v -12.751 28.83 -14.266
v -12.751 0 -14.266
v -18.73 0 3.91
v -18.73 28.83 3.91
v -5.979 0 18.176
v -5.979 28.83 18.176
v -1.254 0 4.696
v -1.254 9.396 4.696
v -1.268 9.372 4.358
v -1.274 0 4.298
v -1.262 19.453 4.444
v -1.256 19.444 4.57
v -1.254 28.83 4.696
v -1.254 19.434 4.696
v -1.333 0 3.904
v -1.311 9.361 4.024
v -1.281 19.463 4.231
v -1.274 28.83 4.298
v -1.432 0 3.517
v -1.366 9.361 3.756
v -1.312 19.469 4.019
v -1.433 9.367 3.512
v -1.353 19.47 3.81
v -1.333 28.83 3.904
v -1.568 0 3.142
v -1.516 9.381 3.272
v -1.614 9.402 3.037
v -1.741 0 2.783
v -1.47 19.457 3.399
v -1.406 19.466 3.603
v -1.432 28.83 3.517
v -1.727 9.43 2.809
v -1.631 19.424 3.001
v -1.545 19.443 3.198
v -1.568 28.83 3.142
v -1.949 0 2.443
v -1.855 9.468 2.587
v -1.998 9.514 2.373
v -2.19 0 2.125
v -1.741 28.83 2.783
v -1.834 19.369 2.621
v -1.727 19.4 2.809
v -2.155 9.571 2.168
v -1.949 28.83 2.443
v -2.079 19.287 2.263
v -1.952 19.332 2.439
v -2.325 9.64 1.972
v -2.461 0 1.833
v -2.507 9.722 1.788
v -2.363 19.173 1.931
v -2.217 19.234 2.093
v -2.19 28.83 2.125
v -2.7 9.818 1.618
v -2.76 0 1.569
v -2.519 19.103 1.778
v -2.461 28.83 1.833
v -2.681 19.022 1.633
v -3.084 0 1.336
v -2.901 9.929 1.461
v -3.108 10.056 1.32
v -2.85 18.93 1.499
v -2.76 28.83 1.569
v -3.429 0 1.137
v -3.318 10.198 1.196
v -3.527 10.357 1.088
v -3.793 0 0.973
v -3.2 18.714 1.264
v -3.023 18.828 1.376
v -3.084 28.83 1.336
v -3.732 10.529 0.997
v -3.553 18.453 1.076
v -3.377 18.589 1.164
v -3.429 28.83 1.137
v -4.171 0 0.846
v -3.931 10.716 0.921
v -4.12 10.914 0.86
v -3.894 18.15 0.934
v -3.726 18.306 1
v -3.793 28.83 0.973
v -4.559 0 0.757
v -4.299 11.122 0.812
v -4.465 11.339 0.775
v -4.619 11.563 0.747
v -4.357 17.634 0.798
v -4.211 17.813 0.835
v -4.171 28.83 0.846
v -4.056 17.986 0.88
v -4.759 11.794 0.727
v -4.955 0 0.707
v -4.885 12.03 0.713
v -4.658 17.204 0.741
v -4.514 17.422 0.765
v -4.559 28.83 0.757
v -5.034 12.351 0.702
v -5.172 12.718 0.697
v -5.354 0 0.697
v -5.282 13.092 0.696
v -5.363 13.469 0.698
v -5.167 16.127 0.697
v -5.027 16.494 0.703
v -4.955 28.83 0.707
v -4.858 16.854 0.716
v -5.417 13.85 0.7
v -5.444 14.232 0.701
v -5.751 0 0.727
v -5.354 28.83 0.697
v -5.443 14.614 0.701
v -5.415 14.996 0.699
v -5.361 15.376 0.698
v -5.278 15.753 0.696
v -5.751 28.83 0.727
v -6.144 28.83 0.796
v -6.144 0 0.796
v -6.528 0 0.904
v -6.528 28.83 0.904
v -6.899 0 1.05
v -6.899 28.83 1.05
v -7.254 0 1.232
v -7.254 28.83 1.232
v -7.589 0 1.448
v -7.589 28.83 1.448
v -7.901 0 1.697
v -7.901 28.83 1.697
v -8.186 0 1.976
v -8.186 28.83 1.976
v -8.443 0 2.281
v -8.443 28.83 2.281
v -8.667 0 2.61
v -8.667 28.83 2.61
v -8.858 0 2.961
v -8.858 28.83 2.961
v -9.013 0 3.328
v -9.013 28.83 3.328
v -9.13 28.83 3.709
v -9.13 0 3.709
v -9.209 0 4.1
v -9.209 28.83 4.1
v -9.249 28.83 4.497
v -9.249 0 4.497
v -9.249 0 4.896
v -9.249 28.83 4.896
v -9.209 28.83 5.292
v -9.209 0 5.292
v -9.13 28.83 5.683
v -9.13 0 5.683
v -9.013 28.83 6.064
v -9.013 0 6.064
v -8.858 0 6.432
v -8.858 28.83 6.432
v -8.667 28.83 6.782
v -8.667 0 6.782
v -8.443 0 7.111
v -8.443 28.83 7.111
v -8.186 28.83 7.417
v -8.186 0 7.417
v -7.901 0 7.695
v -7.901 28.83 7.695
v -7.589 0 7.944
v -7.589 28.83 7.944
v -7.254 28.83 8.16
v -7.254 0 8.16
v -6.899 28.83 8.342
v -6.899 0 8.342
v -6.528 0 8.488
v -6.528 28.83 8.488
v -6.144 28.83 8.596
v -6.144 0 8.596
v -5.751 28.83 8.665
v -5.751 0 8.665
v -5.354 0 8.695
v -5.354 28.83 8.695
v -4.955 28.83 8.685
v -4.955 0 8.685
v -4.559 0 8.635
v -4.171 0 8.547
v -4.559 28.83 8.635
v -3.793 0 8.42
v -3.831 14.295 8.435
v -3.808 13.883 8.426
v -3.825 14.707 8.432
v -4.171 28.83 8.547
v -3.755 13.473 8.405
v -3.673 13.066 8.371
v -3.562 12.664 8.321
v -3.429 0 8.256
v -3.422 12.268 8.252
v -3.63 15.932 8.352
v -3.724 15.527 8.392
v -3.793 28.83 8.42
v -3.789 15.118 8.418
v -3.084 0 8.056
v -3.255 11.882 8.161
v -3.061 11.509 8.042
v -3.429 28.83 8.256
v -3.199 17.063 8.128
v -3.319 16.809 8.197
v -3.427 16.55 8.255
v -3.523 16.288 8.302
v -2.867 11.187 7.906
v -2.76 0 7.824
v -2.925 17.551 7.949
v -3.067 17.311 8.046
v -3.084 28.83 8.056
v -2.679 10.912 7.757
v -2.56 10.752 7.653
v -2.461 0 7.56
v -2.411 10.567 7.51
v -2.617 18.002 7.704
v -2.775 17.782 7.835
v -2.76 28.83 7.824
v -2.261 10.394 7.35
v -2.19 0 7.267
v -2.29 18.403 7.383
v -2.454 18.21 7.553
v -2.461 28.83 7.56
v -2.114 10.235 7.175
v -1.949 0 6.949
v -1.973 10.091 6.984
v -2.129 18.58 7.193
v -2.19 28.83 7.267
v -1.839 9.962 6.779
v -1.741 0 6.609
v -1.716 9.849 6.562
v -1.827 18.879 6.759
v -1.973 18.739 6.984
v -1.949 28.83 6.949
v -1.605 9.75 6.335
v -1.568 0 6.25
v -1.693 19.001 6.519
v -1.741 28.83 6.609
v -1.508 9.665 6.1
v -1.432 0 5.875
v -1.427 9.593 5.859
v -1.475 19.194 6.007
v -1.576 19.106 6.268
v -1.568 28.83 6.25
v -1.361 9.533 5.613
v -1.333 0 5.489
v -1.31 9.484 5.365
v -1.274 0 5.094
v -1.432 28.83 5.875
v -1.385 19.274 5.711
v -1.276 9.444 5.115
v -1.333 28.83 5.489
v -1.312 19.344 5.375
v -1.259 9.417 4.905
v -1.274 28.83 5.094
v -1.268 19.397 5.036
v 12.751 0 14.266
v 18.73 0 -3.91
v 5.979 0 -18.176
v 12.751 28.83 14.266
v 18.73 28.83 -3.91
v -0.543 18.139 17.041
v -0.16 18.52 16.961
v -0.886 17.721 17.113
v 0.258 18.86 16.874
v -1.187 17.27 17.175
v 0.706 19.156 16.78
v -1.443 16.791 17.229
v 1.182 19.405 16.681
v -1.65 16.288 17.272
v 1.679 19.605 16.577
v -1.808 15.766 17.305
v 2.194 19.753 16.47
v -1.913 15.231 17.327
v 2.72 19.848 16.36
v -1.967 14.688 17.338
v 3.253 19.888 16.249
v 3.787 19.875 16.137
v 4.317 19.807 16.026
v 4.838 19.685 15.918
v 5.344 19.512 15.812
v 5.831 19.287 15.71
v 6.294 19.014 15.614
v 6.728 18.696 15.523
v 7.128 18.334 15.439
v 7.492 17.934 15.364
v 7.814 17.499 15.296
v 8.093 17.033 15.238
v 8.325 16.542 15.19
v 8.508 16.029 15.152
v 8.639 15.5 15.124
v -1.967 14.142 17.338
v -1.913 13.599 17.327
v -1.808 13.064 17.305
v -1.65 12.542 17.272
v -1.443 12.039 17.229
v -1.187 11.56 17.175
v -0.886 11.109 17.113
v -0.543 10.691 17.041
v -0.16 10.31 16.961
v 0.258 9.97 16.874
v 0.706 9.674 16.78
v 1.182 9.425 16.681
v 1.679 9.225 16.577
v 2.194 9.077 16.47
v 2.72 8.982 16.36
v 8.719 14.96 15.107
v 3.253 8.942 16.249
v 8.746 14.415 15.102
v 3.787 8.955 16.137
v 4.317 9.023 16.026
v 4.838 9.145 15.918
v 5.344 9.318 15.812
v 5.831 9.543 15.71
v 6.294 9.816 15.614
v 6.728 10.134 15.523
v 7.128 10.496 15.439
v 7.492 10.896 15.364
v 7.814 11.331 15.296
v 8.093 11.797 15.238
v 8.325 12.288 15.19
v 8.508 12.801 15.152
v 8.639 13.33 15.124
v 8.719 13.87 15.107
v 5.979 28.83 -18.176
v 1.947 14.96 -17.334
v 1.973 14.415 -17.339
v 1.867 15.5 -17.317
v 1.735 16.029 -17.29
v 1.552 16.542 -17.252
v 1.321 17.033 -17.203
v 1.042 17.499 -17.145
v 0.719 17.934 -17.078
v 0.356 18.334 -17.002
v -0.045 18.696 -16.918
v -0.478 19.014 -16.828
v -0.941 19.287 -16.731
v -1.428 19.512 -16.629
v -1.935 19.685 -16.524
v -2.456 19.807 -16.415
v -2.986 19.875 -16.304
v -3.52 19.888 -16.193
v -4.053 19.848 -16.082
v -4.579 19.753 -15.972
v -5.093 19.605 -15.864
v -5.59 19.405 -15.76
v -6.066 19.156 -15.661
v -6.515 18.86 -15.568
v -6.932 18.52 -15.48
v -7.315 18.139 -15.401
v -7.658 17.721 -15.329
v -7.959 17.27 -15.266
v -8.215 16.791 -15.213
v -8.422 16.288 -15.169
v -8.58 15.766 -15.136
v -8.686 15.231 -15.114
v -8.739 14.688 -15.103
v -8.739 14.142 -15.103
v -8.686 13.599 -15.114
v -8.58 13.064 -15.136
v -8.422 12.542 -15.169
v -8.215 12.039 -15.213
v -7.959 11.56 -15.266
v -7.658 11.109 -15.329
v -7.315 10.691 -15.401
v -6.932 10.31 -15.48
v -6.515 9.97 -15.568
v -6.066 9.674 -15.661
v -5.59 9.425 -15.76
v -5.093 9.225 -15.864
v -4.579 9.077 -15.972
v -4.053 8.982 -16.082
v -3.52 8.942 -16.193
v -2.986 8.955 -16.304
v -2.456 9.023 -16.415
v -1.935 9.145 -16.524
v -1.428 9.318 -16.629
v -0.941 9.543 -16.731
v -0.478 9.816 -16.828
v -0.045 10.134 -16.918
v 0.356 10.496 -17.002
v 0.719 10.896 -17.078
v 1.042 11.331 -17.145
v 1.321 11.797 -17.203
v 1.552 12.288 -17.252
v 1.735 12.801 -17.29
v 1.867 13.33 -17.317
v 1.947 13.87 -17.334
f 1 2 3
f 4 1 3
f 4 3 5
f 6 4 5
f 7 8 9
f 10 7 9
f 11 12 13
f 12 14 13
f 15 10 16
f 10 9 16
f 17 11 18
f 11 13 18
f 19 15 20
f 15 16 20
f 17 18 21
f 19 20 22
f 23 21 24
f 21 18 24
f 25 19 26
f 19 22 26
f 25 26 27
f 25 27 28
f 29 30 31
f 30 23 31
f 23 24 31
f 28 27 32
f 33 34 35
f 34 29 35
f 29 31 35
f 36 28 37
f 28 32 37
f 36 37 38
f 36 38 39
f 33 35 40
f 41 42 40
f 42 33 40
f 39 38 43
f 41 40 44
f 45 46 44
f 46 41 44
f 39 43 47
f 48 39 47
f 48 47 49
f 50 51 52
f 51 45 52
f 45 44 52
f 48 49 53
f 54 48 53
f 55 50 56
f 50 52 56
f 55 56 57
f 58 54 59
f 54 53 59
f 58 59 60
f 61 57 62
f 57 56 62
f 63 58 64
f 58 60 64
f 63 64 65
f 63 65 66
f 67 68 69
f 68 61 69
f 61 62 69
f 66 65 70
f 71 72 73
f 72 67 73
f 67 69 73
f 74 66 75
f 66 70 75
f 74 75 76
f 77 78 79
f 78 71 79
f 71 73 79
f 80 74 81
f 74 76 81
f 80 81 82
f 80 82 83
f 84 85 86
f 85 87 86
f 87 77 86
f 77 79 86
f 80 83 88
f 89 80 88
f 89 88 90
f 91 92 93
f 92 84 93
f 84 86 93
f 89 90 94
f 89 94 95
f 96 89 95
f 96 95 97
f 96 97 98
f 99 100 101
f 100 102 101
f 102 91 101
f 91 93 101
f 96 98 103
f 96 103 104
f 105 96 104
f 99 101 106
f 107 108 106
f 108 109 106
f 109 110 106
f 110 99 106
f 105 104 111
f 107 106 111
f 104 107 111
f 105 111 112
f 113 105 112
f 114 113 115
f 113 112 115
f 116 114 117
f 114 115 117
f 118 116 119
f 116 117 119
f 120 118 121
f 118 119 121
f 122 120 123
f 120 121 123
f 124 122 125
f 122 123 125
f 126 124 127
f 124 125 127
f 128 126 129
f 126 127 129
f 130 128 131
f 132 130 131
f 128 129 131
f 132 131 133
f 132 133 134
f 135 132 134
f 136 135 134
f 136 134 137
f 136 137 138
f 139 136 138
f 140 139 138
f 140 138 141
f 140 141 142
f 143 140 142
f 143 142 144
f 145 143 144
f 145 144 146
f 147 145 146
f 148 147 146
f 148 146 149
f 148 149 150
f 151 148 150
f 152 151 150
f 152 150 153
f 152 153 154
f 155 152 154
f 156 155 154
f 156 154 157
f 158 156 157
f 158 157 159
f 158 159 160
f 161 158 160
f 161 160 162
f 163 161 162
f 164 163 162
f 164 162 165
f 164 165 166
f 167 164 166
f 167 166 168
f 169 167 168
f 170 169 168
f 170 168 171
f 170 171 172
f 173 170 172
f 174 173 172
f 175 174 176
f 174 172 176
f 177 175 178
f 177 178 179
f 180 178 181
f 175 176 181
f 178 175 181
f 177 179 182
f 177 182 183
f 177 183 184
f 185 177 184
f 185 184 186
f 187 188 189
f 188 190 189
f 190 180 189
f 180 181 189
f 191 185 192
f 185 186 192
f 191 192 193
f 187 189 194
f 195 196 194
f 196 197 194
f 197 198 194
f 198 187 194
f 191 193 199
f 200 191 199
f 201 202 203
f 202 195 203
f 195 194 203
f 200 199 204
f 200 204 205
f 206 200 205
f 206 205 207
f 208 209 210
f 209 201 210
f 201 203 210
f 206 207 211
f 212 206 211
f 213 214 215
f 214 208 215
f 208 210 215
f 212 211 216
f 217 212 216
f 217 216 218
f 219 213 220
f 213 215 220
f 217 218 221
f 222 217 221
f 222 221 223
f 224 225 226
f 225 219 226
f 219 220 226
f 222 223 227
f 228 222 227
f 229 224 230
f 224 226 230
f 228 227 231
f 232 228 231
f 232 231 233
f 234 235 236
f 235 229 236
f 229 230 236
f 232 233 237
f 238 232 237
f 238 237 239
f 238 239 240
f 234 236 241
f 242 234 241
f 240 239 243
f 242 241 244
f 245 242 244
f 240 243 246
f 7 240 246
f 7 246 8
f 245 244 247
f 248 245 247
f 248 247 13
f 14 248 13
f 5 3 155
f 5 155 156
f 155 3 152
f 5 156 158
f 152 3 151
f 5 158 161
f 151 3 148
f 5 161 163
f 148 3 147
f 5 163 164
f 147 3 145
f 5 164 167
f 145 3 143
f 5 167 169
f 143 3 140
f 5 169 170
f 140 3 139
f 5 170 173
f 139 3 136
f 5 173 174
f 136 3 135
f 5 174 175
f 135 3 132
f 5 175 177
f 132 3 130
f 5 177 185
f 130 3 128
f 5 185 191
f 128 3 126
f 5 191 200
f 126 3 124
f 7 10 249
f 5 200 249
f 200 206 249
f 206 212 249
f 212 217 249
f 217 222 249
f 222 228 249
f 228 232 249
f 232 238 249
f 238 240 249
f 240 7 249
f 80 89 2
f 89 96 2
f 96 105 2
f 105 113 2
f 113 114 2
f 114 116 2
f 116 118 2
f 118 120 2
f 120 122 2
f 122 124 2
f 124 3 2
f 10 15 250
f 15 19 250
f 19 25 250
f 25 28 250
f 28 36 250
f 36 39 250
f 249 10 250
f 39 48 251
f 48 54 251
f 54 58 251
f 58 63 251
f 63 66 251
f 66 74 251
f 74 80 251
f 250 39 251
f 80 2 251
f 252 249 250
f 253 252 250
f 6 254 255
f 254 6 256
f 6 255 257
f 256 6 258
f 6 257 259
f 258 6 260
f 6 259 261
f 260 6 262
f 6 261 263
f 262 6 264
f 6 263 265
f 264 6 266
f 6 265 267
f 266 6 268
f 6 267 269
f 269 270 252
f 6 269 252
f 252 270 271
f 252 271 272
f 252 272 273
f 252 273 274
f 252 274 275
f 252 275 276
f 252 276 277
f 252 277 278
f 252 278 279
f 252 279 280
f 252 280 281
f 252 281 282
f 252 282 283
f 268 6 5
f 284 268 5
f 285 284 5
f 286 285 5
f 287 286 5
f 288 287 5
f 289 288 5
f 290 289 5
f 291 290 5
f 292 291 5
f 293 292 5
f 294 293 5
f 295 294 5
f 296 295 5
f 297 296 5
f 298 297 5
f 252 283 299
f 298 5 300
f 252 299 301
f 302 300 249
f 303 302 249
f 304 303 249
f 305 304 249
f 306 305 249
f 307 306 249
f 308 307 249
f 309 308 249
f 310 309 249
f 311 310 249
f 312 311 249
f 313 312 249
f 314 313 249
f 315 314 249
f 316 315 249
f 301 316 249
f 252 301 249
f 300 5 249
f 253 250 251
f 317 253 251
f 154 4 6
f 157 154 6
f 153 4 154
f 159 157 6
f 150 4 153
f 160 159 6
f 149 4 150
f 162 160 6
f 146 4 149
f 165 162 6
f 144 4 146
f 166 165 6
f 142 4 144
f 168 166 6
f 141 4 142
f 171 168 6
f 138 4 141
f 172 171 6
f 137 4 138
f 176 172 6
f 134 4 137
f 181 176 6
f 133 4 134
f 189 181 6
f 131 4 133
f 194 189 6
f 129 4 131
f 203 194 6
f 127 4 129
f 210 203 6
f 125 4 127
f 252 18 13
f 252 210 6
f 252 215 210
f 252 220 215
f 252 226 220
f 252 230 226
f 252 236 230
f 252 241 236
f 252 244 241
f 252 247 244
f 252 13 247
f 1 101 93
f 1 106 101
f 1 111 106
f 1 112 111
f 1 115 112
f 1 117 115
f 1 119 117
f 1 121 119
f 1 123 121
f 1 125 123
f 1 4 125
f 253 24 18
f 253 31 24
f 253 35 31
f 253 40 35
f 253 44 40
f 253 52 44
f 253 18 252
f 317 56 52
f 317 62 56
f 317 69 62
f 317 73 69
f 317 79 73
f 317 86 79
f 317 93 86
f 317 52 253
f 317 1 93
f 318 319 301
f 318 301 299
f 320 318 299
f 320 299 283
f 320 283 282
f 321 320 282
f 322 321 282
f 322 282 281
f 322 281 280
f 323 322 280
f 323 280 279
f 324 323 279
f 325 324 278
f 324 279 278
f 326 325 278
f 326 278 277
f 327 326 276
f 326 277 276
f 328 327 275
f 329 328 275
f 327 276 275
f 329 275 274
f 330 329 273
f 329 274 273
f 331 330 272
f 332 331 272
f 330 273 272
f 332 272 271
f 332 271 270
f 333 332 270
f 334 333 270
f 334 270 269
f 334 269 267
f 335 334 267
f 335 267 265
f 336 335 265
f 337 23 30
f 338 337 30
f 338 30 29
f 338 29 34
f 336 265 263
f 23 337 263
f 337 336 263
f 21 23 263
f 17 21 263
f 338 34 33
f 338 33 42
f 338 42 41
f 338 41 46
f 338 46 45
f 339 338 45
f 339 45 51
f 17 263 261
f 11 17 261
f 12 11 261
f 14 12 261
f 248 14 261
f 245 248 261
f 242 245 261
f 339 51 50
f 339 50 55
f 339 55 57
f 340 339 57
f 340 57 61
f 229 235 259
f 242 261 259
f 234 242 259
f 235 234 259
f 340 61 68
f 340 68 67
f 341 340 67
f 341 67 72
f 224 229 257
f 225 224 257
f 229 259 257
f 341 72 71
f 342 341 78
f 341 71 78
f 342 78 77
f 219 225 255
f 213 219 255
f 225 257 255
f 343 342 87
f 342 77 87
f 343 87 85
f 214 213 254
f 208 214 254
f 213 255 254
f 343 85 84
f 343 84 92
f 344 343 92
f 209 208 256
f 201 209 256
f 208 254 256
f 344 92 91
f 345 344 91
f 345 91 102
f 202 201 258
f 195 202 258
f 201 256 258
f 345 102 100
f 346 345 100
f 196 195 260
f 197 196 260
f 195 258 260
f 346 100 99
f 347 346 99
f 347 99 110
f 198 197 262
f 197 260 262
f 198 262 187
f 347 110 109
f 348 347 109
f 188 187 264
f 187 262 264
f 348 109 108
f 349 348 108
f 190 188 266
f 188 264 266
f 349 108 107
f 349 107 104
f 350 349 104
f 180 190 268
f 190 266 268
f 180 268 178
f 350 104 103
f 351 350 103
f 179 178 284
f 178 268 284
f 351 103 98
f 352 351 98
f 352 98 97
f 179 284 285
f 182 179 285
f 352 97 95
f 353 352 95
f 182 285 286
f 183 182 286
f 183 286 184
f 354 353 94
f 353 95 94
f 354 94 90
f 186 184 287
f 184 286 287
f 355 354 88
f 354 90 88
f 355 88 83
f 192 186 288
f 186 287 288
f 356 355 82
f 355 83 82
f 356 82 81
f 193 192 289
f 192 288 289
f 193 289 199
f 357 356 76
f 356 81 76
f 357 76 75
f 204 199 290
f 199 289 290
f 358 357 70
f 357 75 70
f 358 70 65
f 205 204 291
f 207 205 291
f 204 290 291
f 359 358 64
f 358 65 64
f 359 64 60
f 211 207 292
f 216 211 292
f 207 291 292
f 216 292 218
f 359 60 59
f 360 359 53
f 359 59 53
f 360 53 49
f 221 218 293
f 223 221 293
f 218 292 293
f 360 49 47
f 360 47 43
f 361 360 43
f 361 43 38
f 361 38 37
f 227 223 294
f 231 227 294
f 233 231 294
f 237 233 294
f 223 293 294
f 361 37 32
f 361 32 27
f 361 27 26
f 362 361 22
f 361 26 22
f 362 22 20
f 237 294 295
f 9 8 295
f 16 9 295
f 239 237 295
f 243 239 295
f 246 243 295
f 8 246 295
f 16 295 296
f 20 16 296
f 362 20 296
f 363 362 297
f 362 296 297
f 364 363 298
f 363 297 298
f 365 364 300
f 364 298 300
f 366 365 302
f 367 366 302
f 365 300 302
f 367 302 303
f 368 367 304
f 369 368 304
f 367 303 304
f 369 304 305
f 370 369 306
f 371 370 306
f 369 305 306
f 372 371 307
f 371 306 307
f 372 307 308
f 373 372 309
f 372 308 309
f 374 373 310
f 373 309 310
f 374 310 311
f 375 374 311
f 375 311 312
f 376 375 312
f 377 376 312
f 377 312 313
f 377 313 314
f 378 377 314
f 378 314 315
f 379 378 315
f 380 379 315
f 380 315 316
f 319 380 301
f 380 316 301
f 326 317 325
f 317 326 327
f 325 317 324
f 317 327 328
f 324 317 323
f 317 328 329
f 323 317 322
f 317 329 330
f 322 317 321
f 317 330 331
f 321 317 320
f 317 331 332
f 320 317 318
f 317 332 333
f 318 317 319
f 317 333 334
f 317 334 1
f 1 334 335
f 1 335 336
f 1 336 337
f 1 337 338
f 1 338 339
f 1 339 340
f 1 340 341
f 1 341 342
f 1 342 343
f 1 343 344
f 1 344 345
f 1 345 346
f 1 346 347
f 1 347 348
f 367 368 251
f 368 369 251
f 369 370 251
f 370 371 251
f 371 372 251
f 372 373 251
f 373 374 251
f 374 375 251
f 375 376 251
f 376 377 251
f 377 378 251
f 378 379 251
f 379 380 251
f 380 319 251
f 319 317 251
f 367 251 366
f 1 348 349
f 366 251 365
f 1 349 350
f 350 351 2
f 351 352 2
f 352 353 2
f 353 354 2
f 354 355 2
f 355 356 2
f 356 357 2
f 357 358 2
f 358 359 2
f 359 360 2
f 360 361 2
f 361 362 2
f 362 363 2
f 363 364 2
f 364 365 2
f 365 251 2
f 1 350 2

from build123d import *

# Parameters (mm, degrees)
BOSS_EXTRUDE1_DEPTH = 28.83
SKETCH2_R           = 5.475
CUT_EXTRUDE1_DEPTH  = 82
SKETCH3_R           = 4
CUT_EXTRUDE4_DEPTH  = 29.83


with BuildPart() as part:
    # Sketch1 → Boss-Extrude1 (new body)
    with BuildSketch(Plane(origin=(0, 0, 0), x_dir=(1, 0, 0), z_dir=(0, 1, 0))):
        Polygon((5.97883519, 18.175658977), (-12.75116481, 14.265652648), (-18.73, -3.910006329), (-5.97883519, -18.175658977), (12.75116481, -14.265652648), (18.73, 3.910006329), align=None)
    extrude(amount=BOSS_EXTRUDE1_DEPTH)

    # Sketch2 → Cut-Extrude1 (cut)
    with BuildSketch(Plane(origin=(3.38616481, 0, 16.220655813), x_dir=(0.97889766, 0, -0.204351097), z_dir=(0.204351097, 0, 0.97889766))):
        with Locations((0, 14.415)):
            Circle(SKETCH2_R)
    extrude(amount=-CUT_EXTRUDE1_DEPTH, mode=Mode.SUBTRACT)

    # Sketch3 → Cut-Extrude4 (cut, through all)
    with BuildSketch(Plane(origin=(0, 28.83, 0), x_dir=(1, 0, 0), z_dir=(0, 1, 0))):
        with Locations((-5.253979625, -4.69620015)):
            Circle(SKETCH3_R)
    extrude(amount=-CUT_EXTRUDE4_DEPTH, mode=Mode.SUBTRACT)


solid = part.part
